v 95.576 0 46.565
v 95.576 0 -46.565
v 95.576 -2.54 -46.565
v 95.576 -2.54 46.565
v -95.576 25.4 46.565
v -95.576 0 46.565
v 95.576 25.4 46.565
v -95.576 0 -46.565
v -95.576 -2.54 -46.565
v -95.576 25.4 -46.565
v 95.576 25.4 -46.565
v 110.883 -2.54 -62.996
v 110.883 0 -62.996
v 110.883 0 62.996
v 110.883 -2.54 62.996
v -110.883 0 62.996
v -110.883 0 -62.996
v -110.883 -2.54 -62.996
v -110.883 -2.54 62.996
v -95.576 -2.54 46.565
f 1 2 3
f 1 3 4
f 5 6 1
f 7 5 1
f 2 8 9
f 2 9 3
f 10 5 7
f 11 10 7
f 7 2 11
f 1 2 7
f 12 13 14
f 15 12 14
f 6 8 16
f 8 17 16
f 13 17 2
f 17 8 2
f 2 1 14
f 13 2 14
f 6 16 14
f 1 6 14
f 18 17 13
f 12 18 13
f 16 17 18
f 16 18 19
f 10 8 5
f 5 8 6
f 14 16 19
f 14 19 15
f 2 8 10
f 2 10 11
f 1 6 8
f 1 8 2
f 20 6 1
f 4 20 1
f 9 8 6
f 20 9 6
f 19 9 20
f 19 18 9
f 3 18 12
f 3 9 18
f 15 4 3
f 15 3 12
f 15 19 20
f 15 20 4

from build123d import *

# Parameters (mm, degrees)
F3_W     = 191.1528706551
F3_H     = 93.1293070316
F0_DEPTH = 25.4
F3_W_2   = 221.7658758163
F3_H_2   = 125.9914338589
F1_DEPTH = 2.54


# Not quite as in the source:
# - a feature of the source that left no trace in its solid (it failed there, or was rolled back) is left out


with BuildPart() as f0:
    # F3 (on Front) → F0 (new body)
    with BuildSketch(Plane.XZ):
        Rectangle(F3_W, F3_H)
    extrude(amount=-F0_DEPTH)


with BuildPart() as f1:
    # F3 (on Front) → F1 (new body)
    with BuildSketch(Plane.XZ):
        Rectangle(F3_W_2, F3_H_2)
        Rectangle(F3_W, F3_H, mode=Mode.SUBTRACT)
    extrude(amount=F1_DEPTH)


solid = Compound([f0.part, f1.part])
